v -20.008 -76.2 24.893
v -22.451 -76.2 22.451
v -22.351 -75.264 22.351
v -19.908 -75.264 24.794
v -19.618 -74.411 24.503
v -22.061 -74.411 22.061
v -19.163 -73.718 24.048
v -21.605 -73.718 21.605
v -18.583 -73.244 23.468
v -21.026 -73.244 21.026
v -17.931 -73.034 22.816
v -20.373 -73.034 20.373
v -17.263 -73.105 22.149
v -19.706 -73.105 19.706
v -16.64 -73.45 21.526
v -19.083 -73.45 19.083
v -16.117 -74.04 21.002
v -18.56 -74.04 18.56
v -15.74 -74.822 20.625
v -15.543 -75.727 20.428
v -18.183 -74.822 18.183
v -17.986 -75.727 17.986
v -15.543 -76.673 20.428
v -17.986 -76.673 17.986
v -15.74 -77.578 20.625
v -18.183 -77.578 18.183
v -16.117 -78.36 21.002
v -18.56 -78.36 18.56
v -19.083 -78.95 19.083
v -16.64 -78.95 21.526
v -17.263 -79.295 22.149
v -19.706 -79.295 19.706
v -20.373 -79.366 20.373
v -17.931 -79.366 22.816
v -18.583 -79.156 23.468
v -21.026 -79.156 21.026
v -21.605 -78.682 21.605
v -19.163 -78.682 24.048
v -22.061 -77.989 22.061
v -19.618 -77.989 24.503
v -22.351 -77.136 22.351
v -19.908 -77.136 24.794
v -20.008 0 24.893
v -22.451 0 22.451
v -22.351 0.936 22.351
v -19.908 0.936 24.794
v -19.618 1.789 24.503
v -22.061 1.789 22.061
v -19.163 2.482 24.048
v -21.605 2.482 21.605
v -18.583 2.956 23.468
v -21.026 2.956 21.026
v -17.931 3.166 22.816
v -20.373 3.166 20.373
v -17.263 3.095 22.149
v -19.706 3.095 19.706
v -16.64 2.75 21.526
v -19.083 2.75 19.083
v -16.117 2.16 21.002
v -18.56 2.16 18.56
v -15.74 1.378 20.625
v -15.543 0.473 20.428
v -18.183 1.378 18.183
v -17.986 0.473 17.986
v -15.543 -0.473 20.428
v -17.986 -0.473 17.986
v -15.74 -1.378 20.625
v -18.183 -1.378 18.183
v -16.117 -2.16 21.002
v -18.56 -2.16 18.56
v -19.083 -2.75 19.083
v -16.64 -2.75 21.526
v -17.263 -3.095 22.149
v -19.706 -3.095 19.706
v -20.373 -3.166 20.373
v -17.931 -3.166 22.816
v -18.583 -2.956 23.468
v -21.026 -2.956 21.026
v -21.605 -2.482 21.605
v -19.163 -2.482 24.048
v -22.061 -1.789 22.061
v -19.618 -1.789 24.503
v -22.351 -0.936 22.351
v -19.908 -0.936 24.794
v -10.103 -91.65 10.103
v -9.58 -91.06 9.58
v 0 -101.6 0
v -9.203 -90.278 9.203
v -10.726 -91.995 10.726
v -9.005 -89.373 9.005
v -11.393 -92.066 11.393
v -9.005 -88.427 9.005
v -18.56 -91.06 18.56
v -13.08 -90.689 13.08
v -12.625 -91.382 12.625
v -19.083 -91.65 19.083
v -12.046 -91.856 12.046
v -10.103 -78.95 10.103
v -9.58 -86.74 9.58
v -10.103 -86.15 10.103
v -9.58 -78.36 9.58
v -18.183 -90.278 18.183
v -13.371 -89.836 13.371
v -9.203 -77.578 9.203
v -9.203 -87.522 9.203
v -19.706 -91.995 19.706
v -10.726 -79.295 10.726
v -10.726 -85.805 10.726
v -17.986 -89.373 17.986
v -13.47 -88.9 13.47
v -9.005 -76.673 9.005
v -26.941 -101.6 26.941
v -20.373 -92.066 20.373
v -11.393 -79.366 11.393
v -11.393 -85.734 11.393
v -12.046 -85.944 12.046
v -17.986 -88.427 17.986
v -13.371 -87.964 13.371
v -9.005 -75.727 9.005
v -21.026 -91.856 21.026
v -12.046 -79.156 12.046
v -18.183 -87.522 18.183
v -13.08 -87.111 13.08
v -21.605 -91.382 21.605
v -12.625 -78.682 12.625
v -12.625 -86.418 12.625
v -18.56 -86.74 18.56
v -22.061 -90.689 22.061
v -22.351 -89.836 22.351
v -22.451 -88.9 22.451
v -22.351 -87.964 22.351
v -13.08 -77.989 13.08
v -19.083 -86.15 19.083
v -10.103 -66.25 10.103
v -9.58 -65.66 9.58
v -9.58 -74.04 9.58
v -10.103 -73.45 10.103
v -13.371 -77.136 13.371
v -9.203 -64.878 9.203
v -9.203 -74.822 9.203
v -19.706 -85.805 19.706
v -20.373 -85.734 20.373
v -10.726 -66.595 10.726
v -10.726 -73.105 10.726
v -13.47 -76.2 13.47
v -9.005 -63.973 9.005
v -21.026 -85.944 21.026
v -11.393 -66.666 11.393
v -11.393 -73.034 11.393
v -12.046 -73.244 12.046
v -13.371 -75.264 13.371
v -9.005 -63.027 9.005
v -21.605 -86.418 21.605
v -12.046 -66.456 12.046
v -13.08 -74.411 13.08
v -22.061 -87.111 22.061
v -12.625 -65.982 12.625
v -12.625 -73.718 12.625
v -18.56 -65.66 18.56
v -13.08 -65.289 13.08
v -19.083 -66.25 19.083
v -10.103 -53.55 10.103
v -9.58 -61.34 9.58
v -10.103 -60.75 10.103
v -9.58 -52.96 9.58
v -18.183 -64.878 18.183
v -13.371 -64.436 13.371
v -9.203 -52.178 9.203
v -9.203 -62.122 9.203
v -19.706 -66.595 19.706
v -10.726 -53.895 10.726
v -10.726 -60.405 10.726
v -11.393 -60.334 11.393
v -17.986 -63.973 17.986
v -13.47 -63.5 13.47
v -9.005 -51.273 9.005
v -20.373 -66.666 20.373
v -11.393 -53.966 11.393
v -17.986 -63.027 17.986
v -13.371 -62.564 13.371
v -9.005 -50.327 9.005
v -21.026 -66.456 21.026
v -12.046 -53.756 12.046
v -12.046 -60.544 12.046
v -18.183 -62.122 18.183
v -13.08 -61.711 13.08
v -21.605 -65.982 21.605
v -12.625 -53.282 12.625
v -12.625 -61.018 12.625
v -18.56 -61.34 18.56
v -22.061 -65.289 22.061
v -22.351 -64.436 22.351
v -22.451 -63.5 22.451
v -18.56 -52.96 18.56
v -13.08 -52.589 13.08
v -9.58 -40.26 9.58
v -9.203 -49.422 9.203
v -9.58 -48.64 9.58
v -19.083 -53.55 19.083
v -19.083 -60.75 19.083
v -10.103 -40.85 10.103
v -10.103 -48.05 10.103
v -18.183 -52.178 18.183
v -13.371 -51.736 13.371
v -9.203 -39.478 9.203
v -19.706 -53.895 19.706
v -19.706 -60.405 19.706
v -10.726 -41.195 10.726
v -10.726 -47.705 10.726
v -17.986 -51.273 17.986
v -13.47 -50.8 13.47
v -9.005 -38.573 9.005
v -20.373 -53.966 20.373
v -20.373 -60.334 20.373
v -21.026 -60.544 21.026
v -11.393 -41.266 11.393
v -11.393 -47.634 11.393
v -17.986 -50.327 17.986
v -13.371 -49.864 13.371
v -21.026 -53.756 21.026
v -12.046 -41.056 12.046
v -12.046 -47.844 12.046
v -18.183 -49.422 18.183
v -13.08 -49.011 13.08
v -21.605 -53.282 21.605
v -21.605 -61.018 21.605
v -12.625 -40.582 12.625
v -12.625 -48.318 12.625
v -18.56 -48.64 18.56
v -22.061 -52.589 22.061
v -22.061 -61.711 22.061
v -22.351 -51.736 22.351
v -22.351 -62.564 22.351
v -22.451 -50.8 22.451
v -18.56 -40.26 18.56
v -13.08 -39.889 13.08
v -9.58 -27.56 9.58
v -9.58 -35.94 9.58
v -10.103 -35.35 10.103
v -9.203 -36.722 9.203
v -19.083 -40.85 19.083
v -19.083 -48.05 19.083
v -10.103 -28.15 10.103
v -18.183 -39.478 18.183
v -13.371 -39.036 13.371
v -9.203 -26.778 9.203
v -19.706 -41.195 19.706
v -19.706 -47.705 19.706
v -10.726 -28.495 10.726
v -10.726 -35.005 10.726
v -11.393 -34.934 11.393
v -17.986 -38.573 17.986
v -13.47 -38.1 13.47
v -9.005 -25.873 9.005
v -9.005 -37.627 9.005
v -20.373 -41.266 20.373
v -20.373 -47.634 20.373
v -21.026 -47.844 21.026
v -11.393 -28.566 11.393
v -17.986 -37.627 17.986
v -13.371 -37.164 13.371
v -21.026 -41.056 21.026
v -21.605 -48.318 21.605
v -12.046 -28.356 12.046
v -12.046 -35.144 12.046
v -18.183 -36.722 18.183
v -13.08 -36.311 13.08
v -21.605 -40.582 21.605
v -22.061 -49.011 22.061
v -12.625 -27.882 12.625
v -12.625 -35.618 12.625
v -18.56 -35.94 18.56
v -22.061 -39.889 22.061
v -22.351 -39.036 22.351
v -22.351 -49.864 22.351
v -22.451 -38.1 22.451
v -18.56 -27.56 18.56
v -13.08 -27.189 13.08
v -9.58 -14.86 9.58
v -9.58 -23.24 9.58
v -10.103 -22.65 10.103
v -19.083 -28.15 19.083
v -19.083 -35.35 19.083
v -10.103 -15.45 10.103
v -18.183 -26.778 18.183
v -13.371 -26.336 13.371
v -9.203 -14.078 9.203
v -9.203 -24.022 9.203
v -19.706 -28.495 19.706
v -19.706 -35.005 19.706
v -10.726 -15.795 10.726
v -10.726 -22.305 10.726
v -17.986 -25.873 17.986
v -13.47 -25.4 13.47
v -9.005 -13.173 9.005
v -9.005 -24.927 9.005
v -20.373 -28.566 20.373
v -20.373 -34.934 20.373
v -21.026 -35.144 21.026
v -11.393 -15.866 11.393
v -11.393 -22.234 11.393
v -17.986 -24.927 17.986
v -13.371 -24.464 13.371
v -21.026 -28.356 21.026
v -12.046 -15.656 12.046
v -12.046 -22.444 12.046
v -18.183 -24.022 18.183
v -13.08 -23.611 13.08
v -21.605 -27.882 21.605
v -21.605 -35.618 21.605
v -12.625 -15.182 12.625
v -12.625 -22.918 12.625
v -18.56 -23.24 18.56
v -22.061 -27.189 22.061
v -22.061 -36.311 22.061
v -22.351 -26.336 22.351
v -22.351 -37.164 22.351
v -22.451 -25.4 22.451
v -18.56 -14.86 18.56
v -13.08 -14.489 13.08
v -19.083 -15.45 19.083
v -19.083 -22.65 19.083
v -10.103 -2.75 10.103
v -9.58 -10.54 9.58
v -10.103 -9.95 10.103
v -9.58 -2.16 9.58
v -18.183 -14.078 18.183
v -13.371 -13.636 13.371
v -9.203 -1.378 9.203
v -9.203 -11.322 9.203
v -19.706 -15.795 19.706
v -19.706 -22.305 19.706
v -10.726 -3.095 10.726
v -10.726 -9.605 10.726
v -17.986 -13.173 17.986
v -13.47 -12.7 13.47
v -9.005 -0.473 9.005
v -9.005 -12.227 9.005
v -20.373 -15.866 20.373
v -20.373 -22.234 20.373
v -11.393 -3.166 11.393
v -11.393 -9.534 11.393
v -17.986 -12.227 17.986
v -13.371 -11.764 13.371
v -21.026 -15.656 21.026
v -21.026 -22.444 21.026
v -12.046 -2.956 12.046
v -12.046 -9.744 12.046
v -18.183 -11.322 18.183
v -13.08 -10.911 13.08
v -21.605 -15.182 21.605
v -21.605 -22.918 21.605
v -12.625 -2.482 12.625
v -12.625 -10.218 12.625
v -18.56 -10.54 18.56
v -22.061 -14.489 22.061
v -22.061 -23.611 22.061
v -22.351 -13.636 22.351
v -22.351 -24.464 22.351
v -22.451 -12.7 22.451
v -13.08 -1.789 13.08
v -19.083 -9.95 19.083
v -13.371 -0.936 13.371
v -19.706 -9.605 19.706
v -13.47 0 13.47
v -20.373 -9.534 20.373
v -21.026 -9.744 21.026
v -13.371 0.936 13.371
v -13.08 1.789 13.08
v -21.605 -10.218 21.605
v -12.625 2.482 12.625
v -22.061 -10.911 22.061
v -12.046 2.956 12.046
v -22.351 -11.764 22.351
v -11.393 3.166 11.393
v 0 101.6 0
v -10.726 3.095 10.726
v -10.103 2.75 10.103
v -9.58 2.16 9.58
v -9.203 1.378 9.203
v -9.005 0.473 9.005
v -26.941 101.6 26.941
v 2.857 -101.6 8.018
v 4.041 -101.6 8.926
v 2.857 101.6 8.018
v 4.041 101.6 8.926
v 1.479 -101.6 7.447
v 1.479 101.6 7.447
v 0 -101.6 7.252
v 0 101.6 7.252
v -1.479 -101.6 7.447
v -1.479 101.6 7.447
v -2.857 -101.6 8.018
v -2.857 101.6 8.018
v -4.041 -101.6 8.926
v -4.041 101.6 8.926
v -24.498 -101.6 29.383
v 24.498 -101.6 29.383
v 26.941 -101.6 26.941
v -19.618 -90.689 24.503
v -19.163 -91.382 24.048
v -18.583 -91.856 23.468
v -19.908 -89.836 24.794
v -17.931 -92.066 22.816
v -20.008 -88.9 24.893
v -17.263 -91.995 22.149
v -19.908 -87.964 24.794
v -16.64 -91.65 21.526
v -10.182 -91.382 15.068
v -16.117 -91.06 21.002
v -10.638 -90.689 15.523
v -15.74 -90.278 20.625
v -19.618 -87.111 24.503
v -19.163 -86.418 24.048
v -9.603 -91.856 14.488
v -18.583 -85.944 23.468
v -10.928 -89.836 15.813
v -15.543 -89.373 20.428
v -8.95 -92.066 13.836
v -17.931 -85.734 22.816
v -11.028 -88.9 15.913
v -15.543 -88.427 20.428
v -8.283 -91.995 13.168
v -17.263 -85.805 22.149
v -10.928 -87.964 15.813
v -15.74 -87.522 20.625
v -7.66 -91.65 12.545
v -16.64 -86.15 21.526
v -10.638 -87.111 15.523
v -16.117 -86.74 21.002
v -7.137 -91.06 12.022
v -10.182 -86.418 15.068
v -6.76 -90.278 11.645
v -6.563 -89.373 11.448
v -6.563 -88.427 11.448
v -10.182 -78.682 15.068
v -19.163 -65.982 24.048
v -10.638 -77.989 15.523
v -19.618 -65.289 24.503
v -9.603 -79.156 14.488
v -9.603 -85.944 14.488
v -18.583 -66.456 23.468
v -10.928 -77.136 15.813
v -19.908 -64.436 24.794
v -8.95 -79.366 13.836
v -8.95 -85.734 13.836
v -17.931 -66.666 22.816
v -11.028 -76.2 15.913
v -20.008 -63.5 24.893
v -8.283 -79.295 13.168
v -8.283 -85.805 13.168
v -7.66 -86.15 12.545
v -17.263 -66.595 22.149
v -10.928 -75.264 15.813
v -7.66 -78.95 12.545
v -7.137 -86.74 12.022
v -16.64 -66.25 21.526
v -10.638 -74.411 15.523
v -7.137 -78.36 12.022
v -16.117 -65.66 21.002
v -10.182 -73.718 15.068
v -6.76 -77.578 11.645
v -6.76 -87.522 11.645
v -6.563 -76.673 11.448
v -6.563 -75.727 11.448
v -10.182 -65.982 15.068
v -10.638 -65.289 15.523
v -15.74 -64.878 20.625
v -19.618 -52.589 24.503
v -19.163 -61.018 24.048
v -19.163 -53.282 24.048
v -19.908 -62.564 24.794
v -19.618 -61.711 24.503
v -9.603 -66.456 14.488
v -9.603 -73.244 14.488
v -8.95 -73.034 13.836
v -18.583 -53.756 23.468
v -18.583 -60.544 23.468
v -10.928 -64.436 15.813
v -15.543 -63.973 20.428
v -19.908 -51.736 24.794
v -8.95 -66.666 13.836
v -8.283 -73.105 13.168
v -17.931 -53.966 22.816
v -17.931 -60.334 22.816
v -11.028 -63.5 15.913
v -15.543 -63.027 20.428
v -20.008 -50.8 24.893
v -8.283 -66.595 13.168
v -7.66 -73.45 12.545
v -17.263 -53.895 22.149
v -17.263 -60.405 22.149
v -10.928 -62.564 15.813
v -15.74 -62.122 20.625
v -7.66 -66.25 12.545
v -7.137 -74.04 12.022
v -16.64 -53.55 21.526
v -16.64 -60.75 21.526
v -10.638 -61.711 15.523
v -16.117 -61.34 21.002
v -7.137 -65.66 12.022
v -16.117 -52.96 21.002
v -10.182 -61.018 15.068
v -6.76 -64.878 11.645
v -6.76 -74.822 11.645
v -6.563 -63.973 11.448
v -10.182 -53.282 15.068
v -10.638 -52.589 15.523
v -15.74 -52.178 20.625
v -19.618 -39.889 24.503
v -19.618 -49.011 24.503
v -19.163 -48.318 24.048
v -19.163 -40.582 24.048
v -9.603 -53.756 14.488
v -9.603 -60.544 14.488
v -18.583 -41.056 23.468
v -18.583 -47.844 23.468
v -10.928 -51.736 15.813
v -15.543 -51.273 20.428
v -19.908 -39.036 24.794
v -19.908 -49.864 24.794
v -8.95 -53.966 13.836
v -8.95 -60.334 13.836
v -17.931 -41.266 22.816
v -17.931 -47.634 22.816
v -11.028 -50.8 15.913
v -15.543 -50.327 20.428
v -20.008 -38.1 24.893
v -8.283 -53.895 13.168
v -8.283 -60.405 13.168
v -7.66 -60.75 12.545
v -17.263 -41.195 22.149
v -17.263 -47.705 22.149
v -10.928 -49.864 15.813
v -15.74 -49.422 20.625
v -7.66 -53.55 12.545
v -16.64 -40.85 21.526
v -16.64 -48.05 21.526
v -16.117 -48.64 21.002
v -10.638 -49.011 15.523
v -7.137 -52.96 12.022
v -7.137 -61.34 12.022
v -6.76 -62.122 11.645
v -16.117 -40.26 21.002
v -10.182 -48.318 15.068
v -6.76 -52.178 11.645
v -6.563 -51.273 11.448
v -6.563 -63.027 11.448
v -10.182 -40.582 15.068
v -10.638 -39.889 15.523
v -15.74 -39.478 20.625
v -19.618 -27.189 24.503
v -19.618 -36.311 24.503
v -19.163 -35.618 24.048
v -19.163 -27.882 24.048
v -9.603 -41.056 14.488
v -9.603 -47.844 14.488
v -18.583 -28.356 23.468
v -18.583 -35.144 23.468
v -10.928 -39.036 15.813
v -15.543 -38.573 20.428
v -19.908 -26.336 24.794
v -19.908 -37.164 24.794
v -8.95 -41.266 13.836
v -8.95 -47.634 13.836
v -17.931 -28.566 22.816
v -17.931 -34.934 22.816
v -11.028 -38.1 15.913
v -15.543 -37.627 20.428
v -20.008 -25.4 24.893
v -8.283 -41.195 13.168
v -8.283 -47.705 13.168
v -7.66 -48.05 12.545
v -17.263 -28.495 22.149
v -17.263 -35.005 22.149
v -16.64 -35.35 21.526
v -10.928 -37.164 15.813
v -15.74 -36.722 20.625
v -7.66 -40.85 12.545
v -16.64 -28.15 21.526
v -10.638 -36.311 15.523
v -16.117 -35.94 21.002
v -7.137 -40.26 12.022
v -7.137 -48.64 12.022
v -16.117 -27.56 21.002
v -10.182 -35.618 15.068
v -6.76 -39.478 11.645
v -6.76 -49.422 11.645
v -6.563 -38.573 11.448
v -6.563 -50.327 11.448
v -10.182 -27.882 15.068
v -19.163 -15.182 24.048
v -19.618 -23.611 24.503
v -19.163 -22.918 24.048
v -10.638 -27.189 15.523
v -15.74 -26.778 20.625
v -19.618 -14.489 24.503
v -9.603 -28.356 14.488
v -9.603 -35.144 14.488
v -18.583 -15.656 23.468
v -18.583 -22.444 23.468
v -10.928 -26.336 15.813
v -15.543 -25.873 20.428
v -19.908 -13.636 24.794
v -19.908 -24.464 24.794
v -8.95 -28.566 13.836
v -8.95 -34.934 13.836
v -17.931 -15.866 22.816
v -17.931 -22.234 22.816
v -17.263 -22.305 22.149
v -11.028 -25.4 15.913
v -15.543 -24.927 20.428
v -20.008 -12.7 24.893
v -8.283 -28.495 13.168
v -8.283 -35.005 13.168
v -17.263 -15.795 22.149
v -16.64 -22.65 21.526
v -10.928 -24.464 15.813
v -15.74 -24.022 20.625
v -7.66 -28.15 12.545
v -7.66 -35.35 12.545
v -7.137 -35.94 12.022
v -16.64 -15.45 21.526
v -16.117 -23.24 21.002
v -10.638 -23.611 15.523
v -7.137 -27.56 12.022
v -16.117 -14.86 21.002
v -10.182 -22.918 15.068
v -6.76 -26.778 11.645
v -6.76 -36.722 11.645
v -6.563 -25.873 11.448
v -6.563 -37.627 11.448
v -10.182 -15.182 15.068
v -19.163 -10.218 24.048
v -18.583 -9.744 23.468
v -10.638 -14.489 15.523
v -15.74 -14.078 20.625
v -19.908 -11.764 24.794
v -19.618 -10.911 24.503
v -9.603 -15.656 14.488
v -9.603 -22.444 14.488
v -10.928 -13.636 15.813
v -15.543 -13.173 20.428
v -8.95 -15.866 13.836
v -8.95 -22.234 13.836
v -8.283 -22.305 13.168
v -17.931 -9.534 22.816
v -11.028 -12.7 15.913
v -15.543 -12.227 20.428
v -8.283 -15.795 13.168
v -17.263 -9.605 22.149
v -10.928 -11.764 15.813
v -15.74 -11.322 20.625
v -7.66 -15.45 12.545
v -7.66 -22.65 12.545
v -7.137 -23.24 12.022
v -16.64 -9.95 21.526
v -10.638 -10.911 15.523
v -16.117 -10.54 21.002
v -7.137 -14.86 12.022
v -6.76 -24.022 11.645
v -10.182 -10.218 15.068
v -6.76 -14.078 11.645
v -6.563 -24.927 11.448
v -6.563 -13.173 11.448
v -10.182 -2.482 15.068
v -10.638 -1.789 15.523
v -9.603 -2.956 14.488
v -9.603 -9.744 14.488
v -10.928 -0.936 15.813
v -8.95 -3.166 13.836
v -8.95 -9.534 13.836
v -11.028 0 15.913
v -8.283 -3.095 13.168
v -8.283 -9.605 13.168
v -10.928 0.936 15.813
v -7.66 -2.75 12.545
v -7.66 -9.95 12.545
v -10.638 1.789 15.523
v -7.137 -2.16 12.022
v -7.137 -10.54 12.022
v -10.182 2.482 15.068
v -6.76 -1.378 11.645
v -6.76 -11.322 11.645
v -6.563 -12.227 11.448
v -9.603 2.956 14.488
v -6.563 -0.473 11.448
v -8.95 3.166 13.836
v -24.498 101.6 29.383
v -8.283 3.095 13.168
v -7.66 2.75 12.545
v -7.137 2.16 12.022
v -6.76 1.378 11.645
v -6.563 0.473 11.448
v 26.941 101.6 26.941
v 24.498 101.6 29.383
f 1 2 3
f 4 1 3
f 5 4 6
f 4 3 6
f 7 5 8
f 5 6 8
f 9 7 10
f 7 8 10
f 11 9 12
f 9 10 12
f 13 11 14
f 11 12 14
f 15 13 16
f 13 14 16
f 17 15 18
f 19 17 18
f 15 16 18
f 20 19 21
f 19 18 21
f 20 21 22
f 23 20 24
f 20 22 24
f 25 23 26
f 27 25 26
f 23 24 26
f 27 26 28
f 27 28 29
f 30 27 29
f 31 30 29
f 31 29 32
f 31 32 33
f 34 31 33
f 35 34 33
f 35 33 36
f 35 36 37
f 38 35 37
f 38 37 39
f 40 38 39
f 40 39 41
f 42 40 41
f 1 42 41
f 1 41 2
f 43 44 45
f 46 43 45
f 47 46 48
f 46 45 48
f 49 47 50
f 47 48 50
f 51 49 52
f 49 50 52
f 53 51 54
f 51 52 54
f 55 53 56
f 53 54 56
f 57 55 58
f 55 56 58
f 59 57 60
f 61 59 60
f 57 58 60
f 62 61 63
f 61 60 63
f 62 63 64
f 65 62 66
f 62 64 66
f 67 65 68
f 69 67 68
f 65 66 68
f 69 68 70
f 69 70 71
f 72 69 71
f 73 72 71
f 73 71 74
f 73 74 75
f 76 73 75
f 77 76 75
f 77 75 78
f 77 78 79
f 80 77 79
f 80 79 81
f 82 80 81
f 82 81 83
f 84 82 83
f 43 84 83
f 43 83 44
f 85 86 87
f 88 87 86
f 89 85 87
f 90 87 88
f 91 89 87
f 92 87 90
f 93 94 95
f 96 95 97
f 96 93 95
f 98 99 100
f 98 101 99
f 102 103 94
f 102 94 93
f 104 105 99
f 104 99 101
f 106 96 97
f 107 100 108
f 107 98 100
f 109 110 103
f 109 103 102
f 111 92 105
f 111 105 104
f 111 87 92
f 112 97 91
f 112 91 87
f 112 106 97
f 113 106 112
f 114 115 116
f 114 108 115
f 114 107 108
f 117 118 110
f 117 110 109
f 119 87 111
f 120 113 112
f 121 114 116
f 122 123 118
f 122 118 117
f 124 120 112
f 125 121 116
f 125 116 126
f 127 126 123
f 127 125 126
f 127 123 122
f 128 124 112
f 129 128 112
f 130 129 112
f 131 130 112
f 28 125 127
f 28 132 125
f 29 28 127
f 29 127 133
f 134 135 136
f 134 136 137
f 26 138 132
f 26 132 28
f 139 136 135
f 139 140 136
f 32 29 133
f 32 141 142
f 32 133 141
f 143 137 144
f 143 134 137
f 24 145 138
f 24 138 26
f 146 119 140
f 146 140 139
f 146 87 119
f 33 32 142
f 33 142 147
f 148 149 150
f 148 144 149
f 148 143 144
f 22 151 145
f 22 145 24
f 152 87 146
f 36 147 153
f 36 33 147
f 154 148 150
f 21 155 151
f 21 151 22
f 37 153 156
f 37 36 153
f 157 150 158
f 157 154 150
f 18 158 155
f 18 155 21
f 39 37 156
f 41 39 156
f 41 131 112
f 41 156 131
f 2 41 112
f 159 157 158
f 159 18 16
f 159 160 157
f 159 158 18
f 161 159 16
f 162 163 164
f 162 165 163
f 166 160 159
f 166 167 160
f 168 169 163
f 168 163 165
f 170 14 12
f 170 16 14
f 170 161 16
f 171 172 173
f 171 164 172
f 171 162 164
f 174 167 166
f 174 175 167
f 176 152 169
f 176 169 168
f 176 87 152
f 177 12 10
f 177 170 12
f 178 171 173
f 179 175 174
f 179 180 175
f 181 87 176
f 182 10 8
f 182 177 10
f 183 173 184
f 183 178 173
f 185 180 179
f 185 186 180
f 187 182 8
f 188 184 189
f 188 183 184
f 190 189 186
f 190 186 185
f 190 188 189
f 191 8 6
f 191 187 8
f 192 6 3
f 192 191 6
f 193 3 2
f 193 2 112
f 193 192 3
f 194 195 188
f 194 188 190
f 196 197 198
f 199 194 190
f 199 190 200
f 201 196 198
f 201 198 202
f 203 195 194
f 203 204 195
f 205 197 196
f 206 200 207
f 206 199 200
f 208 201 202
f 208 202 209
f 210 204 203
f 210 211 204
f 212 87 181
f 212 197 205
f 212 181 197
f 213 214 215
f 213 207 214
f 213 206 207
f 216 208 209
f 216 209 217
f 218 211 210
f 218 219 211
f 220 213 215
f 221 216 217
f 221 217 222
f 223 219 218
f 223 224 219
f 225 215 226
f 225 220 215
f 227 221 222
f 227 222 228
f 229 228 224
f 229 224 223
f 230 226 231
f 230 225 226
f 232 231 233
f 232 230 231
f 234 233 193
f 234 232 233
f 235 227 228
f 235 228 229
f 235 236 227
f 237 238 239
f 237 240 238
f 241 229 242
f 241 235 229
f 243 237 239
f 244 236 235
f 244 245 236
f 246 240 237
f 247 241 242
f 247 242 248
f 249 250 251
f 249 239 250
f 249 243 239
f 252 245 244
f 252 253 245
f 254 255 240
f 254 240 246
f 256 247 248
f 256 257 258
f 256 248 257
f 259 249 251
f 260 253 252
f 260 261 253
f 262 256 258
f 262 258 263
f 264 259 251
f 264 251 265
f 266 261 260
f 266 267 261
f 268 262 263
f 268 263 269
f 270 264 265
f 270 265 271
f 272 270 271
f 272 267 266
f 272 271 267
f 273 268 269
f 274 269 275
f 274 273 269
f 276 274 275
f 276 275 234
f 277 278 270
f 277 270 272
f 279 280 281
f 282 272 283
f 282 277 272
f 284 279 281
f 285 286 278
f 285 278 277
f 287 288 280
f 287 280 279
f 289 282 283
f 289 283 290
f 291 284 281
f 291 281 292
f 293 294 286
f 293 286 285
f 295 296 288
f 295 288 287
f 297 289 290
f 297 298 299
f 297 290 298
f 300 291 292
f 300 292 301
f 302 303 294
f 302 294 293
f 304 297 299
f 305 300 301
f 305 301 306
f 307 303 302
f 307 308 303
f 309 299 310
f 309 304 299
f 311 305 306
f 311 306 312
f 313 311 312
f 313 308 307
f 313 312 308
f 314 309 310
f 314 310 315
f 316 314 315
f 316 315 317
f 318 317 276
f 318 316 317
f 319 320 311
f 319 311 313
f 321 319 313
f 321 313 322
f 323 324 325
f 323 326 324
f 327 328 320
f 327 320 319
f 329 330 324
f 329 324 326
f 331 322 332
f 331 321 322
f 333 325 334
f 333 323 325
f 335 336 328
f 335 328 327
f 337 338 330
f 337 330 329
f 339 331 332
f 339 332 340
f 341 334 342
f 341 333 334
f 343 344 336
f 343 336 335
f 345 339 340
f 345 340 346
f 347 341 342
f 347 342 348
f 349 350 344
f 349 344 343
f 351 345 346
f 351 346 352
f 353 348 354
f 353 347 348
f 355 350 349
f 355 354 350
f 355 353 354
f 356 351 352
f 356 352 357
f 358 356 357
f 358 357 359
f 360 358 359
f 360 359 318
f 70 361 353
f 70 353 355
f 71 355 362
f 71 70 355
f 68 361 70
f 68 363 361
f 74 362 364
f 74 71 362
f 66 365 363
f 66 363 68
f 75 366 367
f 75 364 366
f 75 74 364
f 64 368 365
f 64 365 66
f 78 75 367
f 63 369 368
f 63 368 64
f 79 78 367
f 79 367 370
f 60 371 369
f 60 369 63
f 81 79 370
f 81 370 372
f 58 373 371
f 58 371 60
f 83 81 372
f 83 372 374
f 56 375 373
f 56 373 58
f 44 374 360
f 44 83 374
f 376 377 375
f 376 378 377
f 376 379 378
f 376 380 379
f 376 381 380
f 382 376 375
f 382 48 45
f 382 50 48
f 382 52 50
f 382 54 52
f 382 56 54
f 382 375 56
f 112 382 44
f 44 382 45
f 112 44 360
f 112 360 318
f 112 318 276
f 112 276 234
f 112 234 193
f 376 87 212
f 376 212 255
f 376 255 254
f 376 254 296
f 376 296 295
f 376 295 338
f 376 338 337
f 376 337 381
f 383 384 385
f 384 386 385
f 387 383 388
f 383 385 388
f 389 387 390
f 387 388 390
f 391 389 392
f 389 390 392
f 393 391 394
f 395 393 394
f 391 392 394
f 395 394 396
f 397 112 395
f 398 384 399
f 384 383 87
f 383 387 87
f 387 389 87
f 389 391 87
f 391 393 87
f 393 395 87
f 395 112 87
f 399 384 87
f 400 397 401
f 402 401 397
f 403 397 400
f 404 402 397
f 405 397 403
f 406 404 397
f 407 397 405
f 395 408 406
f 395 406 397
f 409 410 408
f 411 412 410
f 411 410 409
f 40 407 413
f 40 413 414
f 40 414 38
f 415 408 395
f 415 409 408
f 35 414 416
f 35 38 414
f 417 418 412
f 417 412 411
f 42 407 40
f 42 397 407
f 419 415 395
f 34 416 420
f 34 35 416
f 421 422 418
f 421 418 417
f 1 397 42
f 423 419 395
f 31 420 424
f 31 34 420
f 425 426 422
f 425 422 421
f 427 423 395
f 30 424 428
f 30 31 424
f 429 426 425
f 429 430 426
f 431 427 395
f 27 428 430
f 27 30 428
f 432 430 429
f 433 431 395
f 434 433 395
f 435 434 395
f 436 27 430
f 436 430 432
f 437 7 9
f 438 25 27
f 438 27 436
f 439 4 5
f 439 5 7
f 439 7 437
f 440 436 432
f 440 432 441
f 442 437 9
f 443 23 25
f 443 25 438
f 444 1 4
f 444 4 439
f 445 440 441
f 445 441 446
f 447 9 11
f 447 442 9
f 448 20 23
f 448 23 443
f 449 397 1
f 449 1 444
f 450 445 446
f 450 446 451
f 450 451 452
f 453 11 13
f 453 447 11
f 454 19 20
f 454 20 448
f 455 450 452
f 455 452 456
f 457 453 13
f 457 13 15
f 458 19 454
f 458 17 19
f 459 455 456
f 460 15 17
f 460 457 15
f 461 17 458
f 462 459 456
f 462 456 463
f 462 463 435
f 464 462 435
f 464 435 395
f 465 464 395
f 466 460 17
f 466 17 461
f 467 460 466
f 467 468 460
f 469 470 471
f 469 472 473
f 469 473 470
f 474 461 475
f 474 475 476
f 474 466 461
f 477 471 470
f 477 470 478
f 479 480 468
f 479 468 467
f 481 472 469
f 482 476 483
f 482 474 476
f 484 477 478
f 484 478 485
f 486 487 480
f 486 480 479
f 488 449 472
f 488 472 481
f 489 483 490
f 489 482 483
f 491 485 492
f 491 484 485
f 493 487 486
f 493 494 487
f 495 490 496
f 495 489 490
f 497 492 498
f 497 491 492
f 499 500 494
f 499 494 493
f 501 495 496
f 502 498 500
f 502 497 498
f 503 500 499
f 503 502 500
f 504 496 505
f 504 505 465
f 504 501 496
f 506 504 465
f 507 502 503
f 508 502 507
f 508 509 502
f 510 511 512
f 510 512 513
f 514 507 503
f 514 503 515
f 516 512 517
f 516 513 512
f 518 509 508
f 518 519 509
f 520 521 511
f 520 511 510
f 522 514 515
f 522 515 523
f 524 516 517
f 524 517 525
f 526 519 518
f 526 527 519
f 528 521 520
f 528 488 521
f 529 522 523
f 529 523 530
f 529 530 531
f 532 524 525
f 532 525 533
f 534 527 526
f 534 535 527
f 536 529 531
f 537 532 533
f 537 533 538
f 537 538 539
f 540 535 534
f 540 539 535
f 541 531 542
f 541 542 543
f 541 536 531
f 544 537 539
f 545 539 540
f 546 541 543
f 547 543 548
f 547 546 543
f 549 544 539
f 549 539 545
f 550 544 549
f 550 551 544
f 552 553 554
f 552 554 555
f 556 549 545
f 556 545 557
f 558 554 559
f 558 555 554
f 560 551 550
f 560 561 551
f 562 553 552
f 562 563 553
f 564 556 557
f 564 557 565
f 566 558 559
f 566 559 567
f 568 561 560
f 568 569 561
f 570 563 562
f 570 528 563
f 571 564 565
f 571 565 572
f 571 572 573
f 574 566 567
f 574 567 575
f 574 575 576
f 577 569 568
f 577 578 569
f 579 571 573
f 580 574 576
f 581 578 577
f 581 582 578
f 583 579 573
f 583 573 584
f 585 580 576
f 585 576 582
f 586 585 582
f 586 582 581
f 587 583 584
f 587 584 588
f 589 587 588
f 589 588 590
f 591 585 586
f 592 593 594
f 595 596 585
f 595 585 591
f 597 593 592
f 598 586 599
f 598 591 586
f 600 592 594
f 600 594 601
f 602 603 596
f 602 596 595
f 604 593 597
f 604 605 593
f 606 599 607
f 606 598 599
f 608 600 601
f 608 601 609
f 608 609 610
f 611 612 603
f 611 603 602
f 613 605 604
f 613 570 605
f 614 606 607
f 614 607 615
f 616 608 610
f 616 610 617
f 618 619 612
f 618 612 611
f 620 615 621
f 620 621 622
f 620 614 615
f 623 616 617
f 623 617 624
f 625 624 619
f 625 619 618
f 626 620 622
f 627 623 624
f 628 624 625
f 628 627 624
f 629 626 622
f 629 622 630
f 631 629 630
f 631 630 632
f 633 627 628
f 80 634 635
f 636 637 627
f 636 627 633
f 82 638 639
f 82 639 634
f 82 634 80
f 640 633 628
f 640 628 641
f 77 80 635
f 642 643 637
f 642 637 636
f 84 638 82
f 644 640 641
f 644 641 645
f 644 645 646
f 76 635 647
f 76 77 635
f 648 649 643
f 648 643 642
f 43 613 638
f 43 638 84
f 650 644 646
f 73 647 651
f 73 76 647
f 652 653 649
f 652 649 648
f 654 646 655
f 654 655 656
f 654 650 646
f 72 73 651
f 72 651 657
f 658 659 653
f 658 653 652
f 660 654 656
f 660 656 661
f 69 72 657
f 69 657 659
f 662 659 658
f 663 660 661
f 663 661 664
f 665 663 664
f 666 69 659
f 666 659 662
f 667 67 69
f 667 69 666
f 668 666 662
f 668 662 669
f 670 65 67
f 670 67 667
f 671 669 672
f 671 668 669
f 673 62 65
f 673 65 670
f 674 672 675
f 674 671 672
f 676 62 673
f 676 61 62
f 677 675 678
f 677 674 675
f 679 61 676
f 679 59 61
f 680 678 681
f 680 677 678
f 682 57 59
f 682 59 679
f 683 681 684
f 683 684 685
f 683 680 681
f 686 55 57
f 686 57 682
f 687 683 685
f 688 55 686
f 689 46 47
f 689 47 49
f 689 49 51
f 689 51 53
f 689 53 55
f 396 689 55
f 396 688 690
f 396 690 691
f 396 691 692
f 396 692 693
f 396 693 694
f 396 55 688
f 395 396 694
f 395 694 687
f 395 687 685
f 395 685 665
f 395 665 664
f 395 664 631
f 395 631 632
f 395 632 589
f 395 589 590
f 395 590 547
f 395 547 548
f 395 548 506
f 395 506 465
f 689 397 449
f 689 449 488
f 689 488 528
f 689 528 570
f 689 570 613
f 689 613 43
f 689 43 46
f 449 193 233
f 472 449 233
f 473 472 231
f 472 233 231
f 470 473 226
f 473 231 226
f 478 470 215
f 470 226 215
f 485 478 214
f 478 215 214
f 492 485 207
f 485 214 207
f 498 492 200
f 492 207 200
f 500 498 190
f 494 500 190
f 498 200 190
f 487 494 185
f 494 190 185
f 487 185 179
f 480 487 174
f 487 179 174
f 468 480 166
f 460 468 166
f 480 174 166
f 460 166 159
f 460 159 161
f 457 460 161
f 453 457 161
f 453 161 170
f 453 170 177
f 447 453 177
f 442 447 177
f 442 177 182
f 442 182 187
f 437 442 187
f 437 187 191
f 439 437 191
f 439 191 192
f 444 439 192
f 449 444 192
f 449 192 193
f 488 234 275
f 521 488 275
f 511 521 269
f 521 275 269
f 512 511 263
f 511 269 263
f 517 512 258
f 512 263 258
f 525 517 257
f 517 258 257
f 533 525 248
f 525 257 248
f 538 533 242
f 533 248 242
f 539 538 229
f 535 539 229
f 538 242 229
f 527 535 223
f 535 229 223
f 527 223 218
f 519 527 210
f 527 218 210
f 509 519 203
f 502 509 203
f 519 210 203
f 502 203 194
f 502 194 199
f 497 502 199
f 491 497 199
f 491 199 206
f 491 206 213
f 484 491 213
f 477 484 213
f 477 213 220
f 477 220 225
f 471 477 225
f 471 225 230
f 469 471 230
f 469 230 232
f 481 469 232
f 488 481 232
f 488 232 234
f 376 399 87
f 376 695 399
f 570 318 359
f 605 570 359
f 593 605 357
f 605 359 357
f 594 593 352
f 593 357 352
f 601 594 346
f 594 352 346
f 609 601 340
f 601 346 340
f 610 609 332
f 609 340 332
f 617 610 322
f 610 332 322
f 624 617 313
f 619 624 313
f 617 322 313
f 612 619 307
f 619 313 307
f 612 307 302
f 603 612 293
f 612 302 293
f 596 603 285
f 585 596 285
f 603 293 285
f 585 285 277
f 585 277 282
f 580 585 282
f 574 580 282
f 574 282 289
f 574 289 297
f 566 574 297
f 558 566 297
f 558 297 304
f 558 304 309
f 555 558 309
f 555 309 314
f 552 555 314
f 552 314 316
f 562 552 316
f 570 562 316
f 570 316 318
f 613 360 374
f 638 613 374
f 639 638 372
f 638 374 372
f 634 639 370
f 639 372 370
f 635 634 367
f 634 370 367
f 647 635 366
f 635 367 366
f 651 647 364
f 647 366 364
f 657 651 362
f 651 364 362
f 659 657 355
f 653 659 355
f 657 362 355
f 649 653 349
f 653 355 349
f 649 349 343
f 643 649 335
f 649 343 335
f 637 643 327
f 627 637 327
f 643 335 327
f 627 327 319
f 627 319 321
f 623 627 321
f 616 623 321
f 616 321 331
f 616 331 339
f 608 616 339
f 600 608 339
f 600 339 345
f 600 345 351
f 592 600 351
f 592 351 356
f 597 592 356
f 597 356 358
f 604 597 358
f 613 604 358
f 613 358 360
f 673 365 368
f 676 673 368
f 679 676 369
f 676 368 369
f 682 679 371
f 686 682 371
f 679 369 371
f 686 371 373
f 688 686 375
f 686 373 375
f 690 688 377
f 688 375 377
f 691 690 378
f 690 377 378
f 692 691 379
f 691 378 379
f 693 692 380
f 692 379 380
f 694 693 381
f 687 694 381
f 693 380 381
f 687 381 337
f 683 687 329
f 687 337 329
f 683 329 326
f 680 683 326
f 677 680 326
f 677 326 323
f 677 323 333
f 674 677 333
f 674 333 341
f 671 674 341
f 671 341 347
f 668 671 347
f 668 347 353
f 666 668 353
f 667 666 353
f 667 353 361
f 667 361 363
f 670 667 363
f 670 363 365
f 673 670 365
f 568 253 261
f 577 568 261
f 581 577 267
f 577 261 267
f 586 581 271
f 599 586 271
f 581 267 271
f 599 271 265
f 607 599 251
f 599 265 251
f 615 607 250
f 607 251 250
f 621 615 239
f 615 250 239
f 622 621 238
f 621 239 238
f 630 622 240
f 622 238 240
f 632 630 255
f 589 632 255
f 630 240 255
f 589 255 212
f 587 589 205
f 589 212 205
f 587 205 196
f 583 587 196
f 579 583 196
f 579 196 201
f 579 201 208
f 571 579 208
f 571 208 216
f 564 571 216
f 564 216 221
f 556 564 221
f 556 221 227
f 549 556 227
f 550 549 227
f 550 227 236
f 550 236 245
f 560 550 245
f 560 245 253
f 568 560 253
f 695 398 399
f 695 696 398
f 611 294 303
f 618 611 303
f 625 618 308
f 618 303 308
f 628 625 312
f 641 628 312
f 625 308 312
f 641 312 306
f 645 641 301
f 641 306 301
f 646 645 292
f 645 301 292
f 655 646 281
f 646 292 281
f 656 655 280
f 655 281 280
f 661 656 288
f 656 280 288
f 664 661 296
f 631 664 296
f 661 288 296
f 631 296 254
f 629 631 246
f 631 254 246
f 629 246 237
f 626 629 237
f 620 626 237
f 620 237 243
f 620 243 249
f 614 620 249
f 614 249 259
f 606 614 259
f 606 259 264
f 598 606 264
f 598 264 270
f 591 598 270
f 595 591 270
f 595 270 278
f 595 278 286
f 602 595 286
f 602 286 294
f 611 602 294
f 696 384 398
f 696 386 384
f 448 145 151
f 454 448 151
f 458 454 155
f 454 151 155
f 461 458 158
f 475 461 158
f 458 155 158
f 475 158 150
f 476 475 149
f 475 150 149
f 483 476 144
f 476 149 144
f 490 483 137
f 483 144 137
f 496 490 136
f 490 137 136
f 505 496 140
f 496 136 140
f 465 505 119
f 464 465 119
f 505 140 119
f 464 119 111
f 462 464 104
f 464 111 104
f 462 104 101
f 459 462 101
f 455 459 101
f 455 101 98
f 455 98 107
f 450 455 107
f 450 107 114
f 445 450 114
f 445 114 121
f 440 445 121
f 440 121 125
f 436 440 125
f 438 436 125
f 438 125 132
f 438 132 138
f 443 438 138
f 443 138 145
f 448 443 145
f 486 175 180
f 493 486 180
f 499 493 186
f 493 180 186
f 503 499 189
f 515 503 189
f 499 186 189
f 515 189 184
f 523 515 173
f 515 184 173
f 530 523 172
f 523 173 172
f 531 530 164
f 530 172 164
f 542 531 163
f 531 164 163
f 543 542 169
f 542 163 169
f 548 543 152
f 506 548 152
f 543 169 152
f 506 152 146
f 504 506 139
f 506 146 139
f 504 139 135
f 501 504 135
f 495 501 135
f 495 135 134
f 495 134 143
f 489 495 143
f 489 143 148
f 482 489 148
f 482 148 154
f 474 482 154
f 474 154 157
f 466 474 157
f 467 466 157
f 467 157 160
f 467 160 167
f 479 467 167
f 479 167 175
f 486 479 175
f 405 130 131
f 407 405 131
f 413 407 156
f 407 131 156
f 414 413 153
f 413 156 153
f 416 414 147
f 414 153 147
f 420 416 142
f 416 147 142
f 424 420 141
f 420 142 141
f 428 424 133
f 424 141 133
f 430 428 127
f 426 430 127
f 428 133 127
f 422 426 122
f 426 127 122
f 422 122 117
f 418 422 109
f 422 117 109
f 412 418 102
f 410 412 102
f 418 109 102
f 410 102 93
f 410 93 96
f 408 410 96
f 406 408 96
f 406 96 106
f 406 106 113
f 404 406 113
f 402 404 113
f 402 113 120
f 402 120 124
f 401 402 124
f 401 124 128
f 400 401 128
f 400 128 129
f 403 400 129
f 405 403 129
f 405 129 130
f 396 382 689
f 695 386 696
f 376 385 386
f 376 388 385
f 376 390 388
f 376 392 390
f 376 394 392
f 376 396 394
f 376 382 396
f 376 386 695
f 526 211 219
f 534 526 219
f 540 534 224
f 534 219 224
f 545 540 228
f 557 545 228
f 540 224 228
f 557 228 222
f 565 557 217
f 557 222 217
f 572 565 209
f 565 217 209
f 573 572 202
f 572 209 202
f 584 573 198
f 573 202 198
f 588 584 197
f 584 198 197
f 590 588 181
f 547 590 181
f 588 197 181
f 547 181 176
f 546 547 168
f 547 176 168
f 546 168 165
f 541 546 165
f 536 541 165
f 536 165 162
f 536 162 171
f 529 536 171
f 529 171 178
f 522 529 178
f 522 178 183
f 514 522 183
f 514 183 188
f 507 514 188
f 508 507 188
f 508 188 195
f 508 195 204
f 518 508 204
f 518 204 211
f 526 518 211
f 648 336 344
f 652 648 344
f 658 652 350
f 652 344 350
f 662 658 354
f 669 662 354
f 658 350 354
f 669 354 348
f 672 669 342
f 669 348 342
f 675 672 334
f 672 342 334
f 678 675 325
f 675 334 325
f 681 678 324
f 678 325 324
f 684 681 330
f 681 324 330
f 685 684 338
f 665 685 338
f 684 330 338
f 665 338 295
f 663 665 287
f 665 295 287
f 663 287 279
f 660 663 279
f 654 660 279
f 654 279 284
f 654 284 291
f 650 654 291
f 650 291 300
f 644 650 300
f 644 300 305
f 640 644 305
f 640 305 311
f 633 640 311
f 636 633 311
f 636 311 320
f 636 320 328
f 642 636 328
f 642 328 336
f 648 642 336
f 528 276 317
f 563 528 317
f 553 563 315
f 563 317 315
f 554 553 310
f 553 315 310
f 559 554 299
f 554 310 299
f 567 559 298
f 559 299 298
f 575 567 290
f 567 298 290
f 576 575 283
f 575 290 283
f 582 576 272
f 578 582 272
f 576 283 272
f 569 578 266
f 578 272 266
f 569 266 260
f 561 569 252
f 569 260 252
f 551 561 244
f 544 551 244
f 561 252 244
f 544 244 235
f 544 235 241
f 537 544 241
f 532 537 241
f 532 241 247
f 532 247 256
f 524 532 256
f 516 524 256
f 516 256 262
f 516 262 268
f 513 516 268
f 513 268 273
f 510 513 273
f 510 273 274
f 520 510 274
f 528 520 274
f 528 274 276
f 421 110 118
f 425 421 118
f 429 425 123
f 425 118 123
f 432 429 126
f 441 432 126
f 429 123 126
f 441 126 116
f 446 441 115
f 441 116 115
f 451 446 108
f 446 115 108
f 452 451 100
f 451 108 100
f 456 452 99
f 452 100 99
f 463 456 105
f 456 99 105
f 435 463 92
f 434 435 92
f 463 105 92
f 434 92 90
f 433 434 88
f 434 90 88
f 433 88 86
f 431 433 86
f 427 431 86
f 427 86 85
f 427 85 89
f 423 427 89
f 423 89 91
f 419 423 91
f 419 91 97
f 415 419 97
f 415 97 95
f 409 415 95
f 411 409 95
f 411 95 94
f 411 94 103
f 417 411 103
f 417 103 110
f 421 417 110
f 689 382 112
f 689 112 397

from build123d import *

# Parameters (mm, degrees)
BOSS_EXTRUDE1_DEPTH             = 101.6
FILLET1_R                       = 5.715
F_1_4_0_25_DIAMETER_HOLE1_D     = 6.35
F_1_4_0_25_DIAMETER_HOLE1_DEPTH = 3.4544
LPATTERN1_COUNT                 = 2
LPATTERN1_PITCH                 = 12.7
LPATTERN1_COUNT_DIR2            = 8
LPATTERN1_PITCH_DIR2            = 12.7


with BuildPart() as part:
    # Sketch1 → Boss-Extrude1 (new body, symmetric)
    with BuildSketch(Plane(origin=(0, 0, 0), x_dir=(1, 0, 0), z_dir=(0, 1, 0))):
        Polygon((0, 0), (-26.940768363, -26.940768363), (-24.498138698, -29.383398028), (0, -4.88525933), (24.498138698, -29.383398028), (26.940768363, -26.940768363), align=None)
    extrude(amount=BOSS_EXTRUDE1_DEPTH, both=True)

    # Fillet1
    fillet1_edges = [part.edges().sort_by_distance(p)[0] for p in [
        (0, 0, 4.88525933),
    ]]
    fillet(fillet1_edges, radius=FILLET1_R)

    # 1/4 (0.25) Diameter Hole1
    with Locations(Plane(origin=(2.442629665, 0, 2.442629665), x_dir=(0.707106781, 0, -0.707106781), z_dir=(0.707106781, 0, 0.707106781))):
        with Locations((-28.575, 0)):
            f_1_4_0_25_diameter_hole1 = Hole(F_1_4_0_25_DIAMETER_HOLE1_D / 2, depth=F_1_4_0_25_DIAMETER_HOLE1_DEPTH)

    # LPattern1: 1_4 _0.25_ Diameter Hole1 2 × 8
    with Locations(*[Vector(0.707106781, 0, -0.707106781) * (i * LPATTERN1_PITCH) + Vector(0, -1, 0) * (j * LPATTERN1_PITCH_DIR2) for i in range(LPATTERN1_COUNT) for j in range(LPATTERN1_COUNT_DIR2) if (i, j) != (0, 0)]):
        add(f_1_4_0_25_diameter_hole1, mode=Mode.SUBTRACT)


solid = part.part
